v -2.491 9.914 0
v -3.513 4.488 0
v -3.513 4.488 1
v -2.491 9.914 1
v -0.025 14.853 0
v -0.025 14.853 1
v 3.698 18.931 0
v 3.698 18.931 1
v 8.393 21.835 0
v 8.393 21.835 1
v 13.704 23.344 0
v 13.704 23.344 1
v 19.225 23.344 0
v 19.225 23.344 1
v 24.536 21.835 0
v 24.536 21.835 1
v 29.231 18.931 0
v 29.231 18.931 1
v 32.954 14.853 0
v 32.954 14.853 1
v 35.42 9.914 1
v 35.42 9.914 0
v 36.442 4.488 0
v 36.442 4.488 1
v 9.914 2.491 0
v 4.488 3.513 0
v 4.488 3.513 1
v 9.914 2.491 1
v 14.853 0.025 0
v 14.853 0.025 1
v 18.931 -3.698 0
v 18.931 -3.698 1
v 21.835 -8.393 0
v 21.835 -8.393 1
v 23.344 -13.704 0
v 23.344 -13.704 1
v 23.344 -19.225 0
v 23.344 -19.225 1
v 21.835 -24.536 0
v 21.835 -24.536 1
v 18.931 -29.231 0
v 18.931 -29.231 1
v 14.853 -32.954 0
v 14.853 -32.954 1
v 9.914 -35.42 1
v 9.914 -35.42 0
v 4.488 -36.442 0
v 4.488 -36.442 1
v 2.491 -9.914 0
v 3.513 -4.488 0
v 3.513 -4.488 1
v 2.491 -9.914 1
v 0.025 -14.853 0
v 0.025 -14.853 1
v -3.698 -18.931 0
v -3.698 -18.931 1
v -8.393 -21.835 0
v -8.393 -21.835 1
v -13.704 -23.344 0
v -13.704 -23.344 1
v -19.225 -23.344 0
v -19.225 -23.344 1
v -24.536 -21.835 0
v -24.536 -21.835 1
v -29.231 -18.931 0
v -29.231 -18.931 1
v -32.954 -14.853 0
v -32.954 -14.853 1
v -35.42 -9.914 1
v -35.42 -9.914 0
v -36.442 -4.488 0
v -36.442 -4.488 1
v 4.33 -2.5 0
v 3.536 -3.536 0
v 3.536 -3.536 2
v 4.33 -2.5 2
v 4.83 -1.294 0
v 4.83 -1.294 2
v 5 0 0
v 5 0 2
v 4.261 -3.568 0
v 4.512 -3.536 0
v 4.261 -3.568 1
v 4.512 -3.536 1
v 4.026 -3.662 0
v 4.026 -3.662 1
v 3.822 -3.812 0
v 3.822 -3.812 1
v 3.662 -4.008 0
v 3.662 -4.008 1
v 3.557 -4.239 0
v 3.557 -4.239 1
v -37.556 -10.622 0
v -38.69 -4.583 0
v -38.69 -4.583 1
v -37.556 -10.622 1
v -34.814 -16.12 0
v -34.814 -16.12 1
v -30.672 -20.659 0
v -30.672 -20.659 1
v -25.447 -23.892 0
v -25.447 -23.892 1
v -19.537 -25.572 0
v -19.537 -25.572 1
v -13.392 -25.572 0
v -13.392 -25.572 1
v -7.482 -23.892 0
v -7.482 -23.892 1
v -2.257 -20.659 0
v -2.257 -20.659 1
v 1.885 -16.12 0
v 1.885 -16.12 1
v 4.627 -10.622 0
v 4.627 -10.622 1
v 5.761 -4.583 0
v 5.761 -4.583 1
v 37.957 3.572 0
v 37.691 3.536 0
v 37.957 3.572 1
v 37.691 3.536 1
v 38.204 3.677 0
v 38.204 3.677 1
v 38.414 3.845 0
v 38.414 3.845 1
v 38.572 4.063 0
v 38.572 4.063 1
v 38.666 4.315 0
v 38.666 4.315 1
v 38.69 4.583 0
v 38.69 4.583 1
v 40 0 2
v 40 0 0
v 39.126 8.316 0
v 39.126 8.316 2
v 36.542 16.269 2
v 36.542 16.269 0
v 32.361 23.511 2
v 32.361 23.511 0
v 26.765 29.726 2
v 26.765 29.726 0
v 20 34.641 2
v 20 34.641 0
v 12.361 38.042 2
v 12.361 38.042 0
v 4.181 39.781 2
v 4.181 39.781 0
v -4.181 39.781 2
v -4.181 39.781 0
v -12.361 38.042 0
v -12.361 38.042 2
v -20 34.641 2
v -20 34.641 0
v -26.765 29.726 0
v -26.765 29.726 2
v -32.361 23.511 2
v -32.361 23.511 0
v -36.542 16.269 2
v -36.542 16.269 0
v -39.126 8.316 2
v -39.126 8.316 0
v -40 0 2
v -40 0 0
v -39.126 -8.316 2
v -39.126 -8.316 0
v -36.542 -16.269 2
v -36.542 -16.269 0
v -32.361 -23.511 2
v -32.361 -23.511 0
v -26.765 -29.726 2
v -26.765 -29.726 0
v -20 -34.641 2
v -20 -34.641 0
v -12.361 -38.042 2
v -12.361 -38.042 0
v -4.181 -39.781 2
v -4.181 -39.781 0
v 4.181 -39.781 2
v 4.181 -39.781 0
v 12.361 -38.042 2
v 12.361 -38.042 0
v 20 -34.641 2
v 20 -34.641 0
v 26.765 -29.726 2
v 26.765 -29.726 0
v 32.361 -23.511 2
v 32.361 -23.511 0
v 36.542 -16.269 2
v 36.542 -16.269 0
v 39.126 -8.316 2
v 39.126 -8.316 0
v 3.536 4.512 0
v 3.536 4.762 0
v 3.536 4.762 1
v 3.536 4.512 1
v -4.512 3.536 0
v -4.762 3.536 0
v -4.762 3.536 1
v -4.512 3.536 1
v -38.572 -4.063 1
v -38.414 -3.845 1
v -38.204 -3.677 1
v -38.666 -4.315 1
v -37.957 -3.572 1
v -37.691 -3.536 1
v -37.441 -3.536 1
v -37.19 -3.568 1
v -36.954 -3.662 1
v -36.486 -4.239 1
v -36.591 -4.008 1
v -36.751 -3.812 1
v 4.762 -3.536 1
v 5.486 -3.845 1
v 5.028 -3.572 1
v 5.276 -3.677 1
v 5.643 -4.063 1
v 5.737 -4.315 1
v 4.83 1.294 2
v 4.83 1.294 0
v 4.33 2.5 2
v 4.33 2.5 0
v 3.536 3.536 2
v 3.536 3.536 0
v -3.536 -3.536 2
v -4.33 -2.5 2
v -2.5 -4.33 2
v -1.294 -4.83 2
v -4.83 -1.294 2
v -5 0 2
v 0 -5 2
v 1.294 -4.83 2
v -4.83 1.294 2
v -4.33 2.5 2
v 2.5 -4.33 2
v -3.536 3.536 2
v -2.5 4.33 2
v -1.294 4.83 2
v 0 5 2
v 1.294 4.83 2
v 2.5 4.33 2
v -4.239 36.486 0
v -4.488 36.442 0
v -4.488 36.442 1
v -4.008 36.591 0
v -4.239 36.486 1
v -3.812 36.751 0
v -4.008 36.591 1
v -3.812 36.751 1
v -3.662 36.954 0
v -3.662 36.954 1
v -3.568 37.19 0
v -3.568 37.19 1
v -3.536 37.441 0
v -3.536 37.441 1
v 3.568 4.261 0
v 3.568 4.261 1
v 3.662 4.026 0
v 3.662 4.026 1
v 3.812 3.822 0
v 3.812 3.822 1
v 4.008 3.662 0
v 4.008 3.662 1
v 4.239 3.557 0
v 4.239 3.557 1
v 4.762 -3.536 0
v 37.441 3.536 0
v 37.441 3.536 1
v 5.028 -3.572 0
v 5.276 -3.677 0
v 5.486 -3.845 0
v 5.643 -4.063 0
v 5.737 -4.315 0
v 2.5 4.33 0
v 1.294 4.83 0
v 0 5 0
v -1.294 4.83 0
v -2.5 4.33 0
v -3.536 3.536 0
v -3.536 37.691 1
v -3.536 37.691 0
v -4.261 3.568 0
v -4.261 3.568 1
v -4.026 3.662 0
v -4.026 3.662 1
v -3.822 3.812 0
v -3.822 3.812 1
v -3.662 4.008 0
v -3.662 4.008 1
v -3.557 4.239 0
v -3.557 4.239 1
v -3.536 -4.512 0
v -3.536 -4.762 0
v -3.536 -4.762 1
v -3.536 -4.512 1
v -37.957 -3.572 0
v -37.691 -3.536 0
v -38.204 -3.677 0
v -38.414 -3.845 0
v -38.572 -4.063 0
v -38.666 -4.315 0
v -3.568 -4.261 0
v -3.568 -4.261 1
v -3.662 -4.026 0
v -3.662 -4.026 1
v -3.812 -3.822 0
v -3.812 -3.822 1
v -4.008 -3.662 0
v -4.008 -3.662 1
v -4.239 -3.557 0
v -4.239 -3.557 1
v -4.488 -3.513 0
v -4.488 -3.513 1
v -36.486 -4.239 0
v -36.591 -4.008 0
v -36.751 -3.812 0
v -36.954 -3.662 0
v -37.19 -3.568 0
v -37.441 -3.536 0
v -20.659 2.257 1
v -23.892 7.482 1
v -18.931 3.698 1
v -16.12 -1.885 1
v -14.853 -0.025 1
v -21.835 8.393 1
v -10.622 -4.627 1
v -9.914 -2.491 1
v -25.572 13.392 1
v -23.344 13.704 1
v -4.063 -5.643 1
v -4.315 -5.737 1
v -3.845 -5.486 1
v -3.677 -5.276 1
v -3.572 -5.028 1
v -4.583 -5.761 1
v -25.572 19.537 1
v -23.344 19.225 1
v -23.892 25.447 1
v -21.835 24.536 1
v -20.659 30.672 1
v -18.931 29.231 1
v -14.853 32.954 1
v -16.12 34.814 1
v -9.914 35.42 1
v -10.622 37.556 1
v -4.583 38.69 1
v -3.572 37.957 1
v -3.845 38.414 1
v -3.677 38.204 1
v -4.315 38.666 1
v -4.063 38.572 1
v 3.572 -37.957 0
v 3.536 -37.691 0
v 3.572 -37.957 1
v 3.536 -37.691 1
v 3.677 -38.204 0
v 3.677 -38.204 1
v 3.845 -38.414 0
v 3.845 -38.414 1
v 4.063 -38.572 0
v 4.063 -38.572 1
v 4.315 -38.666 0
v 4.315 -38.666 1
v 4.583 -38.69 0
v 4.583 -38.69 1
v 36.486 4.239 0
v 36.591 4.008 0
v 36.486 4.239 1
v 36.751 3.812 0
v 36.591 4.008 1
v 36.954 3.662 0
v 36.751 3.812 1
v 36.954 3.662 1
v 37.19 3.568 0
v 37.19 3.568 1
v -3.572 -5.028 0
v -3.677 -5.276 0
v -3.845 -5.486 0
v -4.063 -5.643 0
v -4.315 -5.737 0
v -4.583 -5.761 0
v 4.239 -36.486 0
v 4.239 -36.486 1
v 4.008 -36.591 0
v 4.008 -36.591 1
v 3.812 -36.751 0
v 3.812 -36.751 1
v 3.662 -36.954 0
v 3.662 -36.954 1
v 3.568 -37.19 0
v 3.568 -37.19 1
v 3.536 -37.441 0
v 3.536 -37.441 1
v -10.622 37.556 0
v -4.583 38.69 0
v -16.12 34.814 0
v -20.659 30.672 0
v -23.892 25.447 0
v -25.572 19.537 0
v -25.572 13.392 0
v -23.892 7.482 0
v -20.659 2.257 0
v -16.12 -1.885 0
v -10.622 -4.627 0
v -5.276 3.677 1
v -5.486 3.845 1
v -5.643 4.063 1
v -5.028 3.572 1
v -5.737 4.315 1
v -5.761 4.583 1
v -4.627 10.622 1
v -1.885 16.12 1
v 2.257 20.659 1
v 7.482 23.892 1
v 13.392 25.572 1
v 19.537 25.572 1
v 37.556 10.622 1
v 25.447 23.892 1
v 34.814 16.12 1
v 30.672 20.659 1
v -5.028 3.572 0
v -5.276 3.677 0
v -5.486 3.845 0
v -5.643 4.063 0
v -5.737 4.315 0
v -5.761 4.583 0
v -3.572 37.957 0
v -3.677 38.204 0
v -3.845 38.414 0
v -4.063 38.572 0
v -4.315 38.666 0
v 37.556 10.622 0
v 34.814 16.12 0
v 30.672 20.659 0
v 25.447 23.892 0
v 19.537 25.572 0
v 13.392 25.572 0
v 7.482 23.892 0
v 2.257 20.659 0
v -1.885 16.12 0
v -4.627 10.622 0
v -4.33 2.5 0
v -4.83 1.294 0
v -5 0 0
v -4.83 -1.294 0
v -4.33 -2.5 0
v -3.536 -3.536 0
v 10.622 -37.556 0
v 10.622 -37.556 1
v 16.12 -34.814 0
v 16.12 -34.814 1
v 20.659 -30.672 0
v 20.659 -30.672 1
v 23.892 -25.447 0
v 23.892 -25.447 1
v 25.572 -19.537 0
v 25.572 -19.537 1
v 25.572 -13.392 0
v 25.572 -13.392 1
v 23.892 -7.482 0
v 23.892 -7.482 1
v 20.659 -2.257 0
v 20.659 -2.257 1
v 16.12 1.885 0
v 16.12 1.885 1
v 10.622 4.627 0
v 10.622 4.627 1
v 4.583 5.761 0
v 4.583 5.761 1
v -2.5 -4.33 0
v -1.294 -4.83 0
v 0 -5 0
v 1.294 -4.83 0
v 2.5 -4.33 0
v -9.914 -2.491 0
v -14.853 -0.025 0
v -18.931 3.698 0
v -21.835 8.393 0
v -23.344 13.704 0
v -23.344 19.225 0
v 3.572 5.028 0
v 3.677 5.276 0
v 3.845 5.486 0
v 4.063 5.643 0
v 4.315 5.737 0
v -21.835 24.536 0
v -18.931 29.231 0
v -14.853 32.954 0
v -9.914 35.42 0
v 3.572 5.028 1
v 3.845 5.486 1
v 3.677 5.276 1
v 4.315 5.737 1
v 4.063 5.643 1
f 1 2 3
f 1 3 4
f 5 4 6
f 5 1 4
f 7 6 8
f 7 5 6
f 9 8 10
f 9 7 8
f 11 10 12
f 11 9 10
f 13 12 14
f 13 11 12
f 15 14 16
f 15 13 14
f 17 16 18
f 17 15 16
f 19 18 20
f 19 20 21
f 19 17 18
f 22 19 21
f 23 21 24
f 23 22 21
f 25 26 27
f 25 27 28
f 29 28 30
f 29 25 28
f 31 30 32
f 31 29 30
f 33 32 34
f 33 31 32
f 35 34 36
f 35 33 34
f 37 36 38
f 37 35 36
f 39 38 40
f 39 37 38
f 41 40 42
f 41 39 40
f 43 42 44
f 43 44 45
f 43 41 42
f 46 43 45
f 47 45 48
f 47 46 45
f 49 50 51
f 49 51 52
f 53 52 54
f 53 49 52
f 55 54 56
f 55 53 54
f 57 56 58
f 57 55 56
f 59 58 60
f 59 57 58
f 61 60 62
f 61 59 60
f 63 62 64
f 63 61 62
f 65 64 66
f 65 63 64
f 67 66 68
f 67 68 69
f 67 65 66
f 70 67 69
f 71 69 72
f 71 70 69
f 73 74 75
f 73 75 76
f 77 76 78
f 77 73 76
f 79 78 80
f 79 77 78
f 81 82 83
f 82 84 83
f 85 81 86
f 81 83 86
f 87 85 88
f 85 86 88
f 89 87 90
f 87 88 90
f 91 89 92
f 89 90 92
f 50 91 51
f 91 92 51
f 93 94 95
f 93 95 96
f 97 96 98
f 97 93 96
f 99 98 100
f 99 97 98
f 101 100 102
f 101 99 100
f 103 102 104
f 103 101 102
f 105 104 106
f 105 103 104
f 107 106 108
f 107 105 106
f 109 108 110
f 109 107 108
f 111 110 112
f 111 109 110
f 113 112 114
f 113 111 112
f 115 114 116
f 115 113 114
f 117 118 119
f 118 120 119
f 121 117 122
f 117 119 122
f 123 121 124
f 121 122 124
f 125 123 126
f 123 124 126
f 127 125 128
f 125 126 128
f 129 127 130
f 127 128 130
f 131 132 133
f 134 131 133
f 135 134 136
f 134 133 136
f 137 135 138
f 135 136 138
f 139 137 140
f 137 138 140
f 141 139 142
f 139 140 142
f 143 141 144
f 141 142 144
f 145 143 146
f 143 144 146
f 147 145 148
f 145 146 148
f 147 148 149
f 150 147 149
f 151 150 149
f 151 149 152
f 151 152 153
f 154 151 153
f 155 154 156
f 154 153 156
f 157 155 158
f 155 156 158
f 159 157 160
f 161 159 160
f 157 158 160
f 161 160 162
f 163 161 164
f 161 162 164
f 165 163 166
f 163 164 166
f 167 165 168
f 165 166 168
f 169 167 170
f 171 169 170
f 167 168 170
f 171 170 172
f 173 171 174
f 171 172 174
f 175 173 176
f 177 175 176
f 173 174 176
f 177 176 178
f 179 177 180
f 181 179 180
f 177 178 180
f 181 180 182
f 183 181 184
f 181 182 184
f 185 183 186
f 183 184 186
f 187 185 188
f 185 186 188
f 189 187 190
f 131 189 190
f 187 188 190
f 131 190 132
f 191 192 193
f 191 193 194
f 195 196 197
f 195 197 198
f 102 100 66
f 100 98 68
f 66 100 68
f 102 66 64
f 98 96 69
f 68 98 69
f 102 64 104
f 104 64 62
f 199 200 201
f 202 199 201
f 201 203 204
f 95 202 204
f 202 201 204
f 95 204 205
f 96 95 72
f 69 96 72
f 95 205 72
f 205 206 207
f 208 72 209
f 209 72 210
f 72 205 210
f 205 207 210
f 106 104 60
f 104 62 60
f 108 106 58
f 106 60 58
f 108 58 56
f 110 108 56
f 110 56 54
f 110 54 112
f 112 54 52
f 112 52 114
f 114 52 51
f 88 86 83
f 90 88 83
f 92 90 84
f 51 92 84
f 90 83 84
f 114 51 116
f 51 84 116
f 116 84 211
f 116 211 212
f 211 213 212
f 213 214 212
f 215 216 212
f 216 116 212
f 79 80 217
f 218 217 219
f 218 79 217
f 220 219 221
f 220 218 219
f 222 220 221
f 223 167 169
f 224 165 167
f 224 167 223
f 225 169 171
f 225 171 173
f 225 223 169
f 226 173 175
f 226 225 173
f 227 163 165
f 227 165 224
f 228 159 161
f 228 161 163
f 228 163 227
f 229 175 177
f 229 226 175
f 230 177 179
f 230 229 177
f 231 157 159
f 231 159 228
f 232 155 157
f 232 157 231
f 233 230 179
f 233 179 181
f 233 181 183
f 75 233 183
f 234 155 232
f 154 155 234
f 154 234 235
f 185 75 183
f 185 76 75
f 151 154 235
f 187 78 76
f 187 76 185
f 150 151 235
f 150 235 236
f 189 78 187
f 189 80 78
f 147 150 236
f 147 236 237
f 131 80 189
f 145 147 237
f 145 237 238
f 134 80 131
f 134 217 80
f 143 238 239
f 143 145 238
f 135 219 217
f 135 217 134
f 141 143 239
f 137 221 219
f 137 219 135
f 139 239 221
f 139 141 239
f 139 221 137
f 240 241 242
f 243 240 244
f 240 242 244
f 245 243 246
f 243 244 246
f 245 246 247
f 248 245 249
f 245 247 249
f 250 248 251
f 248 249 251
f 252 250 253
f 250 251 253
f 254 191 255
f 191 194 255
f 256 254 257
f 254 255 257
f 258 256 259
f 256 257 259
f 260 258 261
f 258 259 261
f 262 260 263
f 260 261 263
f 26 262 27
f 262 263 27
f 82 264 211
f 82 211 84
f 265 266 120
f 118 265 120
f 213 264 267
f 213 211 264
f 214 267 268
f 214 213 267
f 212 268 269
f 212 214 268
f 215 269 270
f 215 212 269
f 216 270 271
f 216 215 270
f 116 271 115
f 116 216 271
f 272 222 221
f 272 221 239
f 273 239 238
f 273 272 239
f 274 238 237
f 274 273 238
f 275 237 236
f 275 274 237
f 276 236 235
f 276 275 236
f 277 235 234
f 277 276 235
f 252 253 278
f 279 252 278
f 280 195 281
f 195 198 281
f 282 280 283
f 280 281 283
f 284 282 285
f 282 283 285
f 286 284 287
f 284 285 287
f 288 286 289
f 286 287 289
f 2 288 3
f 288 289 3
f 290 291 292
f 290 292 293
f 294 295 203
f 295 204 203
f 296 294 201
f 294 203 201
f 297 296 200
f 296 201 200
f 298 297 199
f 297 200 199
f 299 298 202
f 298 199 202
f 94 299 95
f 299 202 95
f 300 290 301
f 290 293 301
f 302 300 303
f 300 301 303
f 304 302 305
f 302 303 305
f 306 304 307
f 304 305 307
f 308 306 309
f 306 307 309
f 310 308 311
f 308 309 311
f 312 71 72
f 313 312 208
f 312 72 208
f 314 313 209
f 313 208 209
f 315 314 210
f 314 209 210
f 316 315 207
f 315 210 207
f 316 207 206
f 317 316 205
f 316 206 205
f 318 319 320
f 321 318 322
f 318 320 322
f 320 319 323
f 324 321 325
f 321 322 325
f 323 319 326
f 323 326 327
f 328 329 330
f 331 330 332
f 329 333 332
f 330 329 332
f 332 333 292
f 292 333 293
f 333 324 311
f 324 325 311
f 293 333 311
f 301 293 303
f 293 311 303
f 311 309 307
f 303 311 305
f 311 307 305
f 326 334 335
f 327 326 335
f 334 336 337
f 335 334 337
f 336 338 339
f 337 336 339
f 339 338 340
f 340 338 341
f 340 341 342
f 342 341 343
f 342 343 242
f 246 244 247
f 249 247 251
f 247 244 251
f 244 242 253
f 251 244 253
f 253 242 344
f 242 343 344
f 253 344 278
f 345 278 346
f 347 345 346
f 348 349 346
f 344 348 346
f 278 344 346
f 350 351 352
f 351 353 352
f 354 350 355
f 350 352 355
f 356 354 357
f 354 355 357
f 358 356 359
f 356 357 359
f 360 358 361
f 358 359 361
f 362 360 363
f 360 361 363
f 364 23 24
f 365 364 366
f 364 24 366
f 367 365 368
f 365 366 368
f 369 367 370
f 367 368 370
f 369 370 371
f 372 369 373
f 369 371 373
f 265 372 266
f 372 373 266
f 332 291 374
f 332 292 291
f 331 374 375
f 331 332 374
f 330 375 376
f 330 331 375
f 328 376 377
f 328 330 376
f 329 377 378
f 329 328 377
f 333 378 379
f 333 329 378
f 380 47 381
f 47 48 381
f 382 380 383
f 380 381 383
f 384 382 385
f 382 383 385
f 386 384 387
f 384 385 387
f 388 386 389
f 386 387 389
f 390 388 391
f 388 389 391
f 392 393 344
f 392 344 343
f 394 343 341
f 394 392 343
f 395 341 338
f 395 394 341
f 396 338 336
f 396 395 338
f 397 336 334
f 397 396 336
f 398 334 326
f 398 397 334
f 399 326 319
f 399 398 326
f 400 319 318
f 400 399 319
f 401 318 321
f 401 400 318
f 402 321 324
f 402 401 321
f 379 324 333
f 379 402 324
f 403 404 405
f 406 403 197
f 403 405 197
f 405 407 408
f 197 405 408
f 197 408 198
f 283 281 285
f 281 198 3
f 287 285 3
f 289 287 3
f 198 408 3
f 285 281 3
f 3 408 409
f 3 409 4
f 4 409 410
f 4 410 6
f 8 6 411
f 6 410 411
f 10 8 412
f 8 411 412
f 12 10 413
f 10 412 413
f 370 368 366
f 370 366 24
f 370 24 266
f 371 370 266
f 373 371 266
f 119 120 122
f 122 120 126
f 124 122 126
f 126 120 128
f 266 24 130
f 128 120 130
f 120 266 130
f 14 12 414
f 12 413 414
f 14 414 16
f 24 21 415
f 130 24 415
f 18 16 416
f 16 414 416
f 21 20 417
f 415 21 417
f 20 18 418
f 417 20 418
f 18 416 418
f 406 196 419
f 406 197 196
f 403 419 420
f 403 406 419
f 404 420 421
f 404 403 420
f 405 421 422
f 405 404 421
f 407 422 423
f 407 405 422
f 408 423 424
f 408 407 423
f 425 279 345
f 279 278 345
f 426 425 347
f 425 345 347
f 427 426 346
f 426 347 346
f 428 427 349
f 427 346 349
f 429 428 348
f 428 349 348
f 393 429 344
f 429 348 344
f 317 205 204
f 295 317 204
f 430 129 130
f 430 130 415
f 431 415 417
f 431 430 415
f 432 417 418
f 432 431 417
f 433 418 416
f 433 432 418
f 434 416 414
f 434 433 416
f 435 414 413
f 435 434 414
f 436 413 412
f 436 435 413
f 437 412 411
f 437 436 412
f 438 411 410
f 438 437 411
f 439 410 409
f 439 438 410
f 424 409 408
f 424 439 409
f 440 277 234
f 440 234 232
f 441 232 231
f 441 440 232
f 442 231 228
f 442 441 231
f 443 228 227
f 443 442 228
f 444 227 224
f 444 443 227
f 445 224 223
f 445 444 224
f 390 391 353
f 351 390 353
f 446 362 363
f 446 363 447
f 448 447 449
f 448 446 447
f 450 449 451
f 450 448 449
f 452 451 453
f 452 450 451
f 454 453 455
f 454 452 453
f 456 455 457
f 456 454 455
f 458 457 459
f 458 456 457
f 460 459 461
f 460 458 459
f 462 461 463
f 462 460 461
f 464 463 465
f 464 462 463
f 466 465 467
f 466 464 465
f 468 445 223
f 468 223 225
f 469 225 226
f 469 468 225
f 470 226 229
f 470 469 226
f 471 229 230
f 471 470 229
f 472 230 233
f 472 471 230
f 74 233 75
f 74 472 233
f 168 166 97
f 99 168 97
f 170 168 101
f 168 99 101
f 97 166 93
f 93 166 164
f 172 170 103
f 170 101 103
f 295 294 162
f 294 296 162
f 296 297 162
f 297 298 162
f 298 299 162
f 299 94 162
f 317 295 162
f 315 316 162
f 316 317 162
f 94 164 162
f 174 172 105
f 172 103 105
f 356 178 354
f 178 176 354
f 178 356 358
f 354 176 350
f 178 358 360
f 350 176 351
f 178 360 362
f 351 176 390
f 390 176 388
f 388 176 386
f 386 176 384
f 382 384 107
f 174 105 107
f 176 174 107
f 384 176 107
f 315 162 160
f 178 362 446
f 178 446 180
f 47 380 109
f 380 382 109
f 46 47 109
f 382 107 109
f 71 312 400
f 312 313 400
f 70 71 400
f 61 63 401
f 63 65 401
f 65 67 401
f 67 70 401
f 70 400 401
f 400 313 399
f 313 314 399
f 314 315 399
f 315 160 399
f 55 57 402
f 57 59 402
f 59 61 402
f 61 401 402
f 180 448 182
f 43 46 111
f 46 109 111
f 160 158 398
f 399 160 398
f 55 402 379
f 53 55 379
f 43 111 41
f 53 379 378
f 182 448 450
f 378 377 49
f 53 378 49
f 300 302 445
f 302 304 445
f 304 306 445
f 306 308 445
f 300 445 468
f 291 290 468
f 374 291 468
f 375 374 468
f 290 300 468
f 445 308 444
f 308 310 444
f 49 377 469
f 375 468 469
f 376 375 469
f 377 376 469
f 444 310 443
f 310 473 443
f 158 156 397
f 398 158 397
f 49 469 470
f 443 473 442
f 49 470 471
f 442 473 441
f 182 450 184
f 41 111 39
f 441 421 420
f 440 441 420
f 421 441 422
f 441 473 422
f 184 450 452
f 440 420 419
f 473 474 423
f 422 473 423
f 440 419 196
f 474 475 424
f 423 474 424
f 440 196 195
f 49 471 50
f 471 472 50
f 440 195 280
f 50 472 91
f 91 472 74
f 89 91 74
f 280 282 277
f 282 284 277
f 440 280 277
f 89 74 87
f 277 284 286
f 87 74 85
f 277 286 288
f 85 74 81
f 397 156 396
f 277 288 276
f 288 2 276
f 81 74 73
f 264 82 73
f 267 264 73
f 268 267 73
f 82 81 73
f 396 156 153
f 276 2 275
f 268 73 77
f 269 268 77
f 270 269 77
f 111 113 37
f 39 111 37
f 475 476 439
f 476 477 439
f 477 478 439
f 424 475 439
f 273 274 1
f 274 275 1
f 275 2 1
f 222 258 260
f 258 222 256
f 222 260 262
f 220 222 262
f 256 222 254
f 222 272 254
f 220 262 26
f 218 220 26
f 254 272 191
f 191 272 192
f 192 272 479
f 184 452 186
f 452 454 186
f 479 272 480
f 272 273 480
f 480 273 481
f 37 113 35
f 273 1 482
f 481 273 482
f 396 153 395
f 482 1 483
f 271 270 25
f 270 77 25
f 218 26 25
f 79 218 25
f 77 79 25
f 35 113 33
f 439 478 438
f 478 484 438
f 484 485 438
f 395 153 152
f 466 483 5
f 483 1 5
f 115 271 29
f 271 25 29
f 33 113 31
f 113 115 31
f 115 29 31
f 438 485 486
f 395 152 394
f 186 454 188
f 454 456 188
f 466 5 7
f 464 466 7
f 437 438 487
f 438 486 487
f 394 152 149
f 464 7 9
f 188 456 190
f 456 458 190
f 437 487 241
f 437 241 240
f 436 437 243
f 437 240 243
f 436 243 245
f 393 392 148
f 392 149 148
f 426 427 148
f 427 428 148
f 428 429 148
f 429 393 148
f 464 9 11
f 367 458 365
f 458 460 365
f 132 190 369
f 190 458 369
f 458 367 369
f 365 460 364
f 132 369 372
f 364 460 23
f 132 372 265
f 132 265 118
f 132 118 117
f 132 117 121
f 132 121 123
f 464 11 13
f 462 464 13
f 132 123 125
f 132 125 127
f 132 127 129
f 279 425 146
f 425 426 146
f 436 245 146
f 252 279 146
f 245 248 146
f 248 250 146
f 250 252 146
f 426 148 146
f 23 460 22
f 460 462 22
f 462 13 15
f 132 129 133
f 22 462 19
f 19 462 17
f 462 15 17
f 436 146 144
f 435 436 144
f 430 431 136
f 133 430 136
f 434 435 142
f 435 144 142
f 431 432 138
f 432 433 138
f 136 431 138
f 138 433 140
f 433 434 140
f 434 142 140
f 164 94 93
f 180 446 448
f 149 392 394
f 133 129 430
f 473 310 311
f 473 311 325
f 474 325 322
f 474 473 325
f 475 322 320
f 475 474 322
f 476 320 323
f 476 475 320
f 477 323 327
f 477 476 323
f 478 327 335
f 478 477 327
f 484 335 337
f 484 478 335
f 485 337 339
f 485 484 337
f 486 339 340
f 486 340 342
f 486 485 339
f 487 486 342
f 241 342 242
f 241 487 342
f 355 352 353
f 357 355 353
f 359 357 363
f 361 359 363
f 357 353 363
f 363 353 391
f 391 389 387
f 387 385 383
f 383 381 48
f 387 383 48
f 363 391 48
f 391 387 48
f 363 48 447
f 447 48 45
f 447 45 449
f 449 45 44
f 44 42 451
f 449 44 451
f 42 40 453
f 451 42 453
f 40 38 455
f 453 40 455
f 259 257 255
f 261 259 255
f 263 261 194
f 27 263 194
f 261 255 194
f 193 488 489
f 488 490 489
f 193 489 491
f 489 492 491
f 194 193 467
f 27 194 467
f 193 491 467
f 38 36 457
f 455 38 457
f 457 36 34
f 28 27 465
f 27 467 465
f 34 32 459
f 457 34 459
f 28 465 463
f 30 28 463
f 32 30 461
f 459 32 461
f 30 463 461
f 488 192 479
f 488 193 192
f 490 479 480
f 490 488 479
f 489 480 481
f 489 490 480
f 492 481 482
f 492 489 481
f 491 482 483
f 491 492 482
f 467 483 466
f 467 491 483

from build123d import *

# Parameters (mm, degrees)
F0_R     = 40
F1_DEPTH = 2
F2_DEPTH = 1
F3_R     = 1
F4_DEPTH = 25


with BuildPart() as f1:
    # F0 (on Top) → F1 (new body)
    with BuildSketch(Plane.XY):
        Circle(F0_R)
        with BuildLine():
            ThreePointArc((-36.4644660941, -3.5355339059), (-16.4644660941, -23.5355339059), (3.5355339059, -3.5355339059))
            Line((3.5355339059, -3.5355339059), (5.7855339059, -3.5355339059))
            ThreePointArc((5.7855339059, -3.5355339059), (-16.4644660941, -25.7855339059), (-38.7144660941, -3.5355339059))
            Line((-38.7144660941, -3.5355339059), (-36.4644660941, -3.5355339059))
        make_face(mode=Mode.SUBTRACT)
        with BuildLine():
            ThreePointArc((3.5355339059, -36.4644660941), (23.5355339059, -16.4644660941), (3.5355339059, 3.5355339059))
            Line((3.5355339059, 3.5355339059), (3.5355339059, 5.7855339059))
            ThreePointArc((3.5355339059, 5.7855339059), (25.7855339059, -16.4644660941), (3.5355339059, -38.7144660941))
            Line((3.5355339059, -38.7144660941), (3.5355339059, -36.4644660941))
        make_face(mode=Mode.SUBTRACT)
        with BuildLine():
            ThreePointArc((-3.5355339059, 36.4644660941), (-23.5355339059, 16.4644660941), (-3.5355339059, -3.5355339059))
            Line((-3.5355339059, -3.5355339059), (-3.5355339059, -5.7855339059))
            ThreePointArc((-3.5355339059, -5.7855339059), (-25.7855339059, 16.4644660941), (-3.5355339059, 38.7144660941))
            Line((-3.5355339059, 38.7144660941), (-3.5355339059, 36.4644660941))
        make_face(mode=Mode.SUBTRACT)
        with BuildLine():
            ThreePointArc((3.5355339059, 3.5355339059), (4.6193976626, 1.9134171618), (5, 0))
            ThreePointArc((5, 0), (4.6193976626, -1.9134171618), (3.5355339059, -3.5355339059))
            ThreePointArc((3.5355339059, -3.5355339059), (0, -5), (-3.5355339059, -3.5355339059))
            ThreePointArc((-3.5355339059, -3.5355339059), (-5, 0), (-3.5355339059, 3.5355339059))
            ThreePointArc((-3.5355339059, 3.5355339059), (0, 5), (3.5355339059, 3.5355339059))
        make_face(mode=Mode.SUBTRACT)
        with BuildLine():
            ThreePointArc((36.4644660941, 3.5355339059), (16.4644660941, 23.5355339059), (-3.5355339059, 3.5355339059))
            Line((-3.5355339059, 3.5355339059), (-5.7855339059, 3.5355339059))
            ThreePointArc((-5.7855339059, 3.5355339059), (16.4644660941, 25.7855339059), (38.7144660941, 3.5355339059))
            Line((38.7144660941, 3.5355339059), (36.4644660941, 3.5355339059))
        make_face(mode=Mode.SUBTRACT)
        with BuildLine():
            Line((-3.5355339059, -5.7855339059), (-3.5355339059, -3.5355339059))
            ThreePointArc((-3.5355339059, -3.5355339059), (-23.5355339059, 16.4644660941), (-3.5355339059, 36.4644660941))
            Line((-3.5355339059, 36.4644660941), (-3.5355339059, 38.7144660941))
            ThreePointArc((-3.5355339059, 38.7144660941), (-25.7855339059, 16.4644660941), (-3.5355339059, -5.7855339059))
        make_face()
        with BuildLine():
            Line((5.7855339059, -3.5355339059), (3.5355339059, -3.5355339059))
            ThreePointArc((3.5355339059, -3.5355339059), (-16.4644660941, -23.5355339059), (-36.4644660941, -3.5355339059))
            Line((-36.4644660941, -3.5355339059), (-38.7144660941, -3.5355339059))
            ThreePointArc((-38.7144660941, -3.5355339059), (-16.4644660941, -25.7855339059), (5.7855339059, -3.5355339059))
        make_face()
        with BuildLine():
            Line((3.5355339059, 5.7855339059), (3.5355339059, 3.5355339059))
            ThreePointArc((3.5355339059, 3.5355339059), (23.5355339059, -16.4644660941), (3.5355339059, -36.4644660941))
            Line((3.5355339059, -36.4644660941), (3.5355339059, -38.7144660941))
            ThreePointArc((3.5355339059, -38.7144660941), (25.7855339059, -16.4644660941), (3.5355339059, 5.7855339059))
        make_face()
        with BuildLine():
            Line((-5.7855339059, 3.5355339059), (-3.5355339059, 3.5355339059))
            ThreePointArc((-3.5355339059, 3.5355339059), (16.4644660941, 23.5355339059), (36.4644660941, 3.5355339059))
            Line((36.4644660941, 3.5355339059), (38.7144660941, 3.5355339059))
            ThreePointArc((38.7144660941, 3.5355339059), (16.4644660941, 25.7855339059), (-5.7855339059, 3.5355339059))
        make_face()
        Polygon((0, 0), (3.5355339059, 3.5355339059), (-3.5355339059, 3.5355339059), align=None)
        with BuildLine():
            Line((-3.5355339059, 3.5355339059), (3.5355339059, 3.5355339059))
            ThreePointArc((3.5355339059, 3.5355339059), (0, 5), (-3.5355339059, 3.5355339059))
        make_face()
        Polygon((0, 0), (-3.5355339059, 3.5355339059), (-3.5355339059, -3.5355339059), align=None)
        Polygon((-3.5355339059, -3.5355339059), (3.5355339059, -3.5355339059), (0, 0), align=None)
        Polygon((3.5355339059, -3.5355339059), (3.5355339059, 3.5355339059), (0, 0), align=None)
        with BuildLine():
            ThreePointArc((3.5355339059, -3.5355339059), (4.6193976626, -1.9134171618), (5, 0))
            ThreePointArc((5, 0), (4.6193976626, 1.9134171618), (3.5355339059, 3.5355339059))
            Line((3.5355339059, 3.5355339059), (3.5355339059, -3.5355339059))
        make_face()
        with BuildLine():
            ThreePointArc((-3.5355339059, -3.5355339059), (0, -5), (3.5355339059, -3.5355339059))
            Line((3.5355339059, -3.5355339059), (-3.5355339059, -3.5355339059))
        make_face()
        with BuildLine():
            Line((-3.5355339059, -3.5355339059), (-3.5355339059, 3.5355339059))
            ThreePointArc((-3.5355339059, 3.5355339059), (-5, 0), (-3.5355339059, -3.5355339059))
        make_face()
    extrude(amount=F1_DEPTH)

    # F0 (on Top) → F2 (cut)
    with BuildSketch(Plane.XY):
        with BuildLine():
            Line((-5.7855339059, 3.5355339059), (-3.5355339059, 3.5355339059))
            ThreePointArc((-3.5355339059, 3.5355339059), (16.4644660941, 23.5355339059), (36.4644660941, 3.5355339059))
            Line((36.4644660941, 3.5355339059), (38.7144660941, 3.5355339059))
            ThreePointArc((38.7144660941, 3.5355339059), (16.4644660941, 25.7855339059), (-5.7855339059, 3.5355339059))
        make_face()
        with BuildLine():
            Line((3.5355339059, 5.7855339059), (3.5355339059, 3.5355339059))
            ThreePointArc((3.5355339059, 3.5355339059), (23.5355339059, -16.4644660941), (3.5355339059, -36.4644660941))
            Line((3.5355339059, -36.4644660941), (3.5355339059, -38.7144660941))
            ThreePointArc((3.5355339059, -38.7144660941), (25.7855339059, -16.4644660941), (3.5355339059, 5.7855339059))
        make_face()
        with BuildLine():
            Line((5.7855339059, -3.5355339059), (3.5355339059, -3.5355339059))
            ThreePointArc((3.5355339059, -3.5355339059), (-16.4644660941, -23.5355339059), (-36.4644660941, -3.5355339059))
            Line((-36.4644660941, -3.5355339059), (-38.7144660941, -3.5355339059))
            ThreePointArc((-38.7144660941, -3.5355339059), (-16.4644660941, -25.7855339059), (5.7855339059, -3.5355339059))
        make_face()
        with BuildLine():
            Line((-3.5355339059, -5.7855339059), (-3.5355339059, -3.5355339059))
            ThreePointArc((-3.5355339059, -3.5355339059), (-23.5355339059, 16.4644660941), (-3.5355339059, 36.4644660941))
            Line((-3.5355339059, 36.4644660941), (-3.5355339059, 38.7144660941))
            ThreePointArc((-3.5355339059, 38.7144660941), (-25.7855339059, 16.4644660941), (-3.5355339059, -5.7855339059))
        make_face()
    extrude(amount=F2_DEPTH, mode=Mode.SUBTRACT)

    # F3
    f3_edges = [f1.edges().sort_by_distance(p)[0] for p in [
        (-5.785534, 3.535534, 0.5),
        (-3.535534, 3.535534, 0.5),
        (-3.535534, -5.785534, 0.5),
        (-3.535534, -3.535534, 0.5),
        (5.785534, -3.535534, 0.5),
        (3.535534, -3.535534, 0.5),
        (3.535534, 5.785534, 0.5),
        (3.535534, 3.535534, 0.5),
        (3.535534, -38.714466, 0.5),
        (3.535534, -36.464466, 0.5),
        (-38.714466, -3.535534, 0.5),
        (-36.464466, -3.535534, 0.5),
        (-3.535534, 38.714466, 0.5),
        (-3.535534, 36.464466, 0.5),
        (38.714466, 3.535534, 0.5),
        (36.464466, 3.535534, 0.5),
    ]]
    fillet(f3_edges, radius=F3_R)

    # F0 (on Top) → F4 (cut)
    with BuildSketch(Plane.XY):
        Polygon((3.5355339059, -3.5355339059), (3.5355339059, 3.5355339059), (0, 0), align=None)
        with BuildLine():
            ThreePointArc((3.5355339059, -3.5355339059), (4.6193976626, -1.9134171618), (5, 0))
            ThreePointArc((5, 0), (4.6193976626, 1.9134171618), (3.5355339059, 3.5355339059))
            Line((3.5355339059, 3.5355339059), (3.5355339059, -3.5355339059))
        make_face()
        Polygon((-3.5355339059, -3.5355339059), (3.5355339059, -3.5355339059), (0, 0), align=None)
        with BuildLine():
            ThreePointArc((-3.5355339059, -3.5355339059), (0, -5), (3.5355339059, -3.5355339059))
            Line((3.5355339059, -3.5355339059), (-3.5355339059, -3.5355339059))
        make_face()
        Polygon((0, 0), (-3.5355339059, 3.5355339059), (-3.5355339059, -3.5355339059), align=None)
        Polygon((0, 0), (3.5355339059, 3.5355339059), (-3.5355339059, 3.5355339059), align=None)
        with BuildLine():
            Line((-3.5355339059, 3.5355339059), (3.5355339059, 3.5355339059))
            ThreePointArc((3.5355339059, 3.5355339059), (0, 5), (-3.5355339059, 3.5355339059))
        make_face()
        with BuildLine():
            Line((-3.5355339059, -3.5355339059), (-3.5355339059, 3.5355339059))
            ThreePointArc((-3.5355339059, 3.5355339059), (-5, 0), (-3.5355339059, -3.5355339059))
        make_face()
    extrude(amount=F4_DEPTH, mode=Mode.SUBTRACT)


solid = f1.part
